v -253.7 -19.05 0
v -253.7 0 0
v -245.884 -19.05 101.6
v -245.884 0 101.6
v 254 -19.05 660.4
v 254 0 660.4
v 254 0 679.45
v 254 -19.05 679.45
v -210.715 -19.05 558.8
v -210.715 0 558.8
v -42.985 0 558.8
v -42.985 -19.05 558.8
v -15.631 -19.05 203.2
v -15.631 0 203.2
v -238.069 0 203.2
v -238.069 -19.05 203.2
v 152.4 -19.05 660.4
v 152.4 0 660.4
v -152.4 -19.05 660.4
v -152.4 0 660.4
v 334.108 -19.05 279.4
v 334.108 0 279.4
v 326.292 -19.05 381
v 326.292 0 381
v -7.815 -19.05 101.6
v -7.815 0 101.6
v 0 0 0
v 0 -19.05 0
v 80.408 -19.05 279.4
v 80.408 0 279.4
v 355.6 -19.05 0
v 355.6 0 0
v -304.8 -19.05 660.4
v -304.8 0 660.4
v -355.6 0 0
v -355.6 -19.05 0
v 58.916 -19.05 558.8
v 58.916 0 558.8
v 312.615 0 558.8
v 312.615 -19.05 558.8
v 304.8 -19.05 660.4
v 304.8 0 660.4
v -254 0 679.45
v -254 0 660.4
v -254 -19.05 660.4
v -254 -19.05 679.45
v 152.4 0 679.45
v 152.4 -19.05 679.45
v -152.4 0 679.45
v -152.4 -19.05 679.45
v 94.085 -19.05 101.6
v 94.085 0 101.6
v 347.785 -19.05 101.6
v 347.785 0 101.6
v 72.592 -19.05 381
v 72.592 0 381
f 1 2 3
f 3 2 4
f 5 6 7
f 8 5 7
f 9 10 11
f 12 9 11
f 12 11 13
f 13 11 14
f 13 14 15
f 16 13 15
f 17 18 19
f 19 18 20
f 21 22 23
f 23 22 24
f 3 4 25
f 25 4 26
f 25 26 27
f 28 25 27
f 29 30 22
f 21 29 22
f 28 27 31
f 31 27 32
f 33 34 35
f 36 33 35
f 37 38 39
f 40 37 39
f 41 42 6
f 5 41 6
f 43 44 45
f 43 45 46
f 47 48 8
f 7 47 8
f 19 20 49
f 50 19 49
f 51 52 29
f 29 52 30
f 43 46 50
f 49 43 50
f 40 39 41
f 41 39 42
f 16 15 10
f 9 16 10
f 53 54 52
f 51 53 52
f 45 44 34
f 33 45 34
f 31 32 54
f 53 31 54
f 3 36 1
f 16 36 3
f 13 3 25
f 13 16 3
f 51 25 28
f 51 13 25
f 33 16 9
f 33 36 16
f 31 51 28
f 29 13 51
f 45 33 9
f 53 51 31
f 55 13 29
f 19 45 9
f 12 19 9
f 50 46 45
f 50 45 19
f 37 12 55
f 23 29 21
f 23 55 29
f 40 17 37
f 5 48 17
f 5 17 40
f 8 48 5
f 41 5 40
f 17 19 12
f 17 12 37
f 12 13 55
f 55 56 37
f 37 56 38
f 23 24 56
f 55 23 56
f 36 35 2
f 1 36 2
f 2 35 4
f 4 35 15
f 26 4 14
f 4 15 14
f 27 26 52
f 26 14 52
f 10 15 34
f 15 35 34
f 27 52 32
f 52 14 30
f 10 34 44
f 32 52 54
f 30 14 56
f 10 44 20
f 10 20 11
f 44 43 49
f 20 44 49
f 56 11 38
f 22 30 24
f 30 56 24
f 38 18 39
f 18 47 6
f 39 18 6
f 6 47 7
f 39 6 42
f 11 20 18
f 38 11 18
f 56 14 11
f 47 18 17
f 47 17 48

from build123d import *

# Parameters (mm, degrees)
F1_DEPTH = 19.05
F2_W     = 101.6
F2_H     = 19.05
F3_DEPTH = 19.05


with BuildPart() as f1:
    # F0 (on Front) → F1 (new body)
    with BuildSketch(Plane.XZ):
        Polygon((304.8, 660.4), (51.1001483644, 660.4), (58.9155329798, 558.8), (312.6153846154, 558.8), align=None)
        Polygon((94.084763749, 101.6), (101.9001483644, 0), (355.6, 0), (347.7846153846, 101.6), align=None)
        Polygon((-238.0690824048, 203.2), (-245.8844670202, 101.6), (-7.8153846154, 101.6), (-15.6307692308, 203.2), align=None)
        Polygon((326.2923076923, 381), (72.5924560567, 381), (80.4078406721, 279.4), (334.1076923077, 279.4), align=None)
        Polygon((-202.8998516356, 660.4), (-304.8, 660.4), (-355.6, 0), (-253.6998516356, 0), (-245.8844670202, 101.6), (-238.0690824048, 203.2), (-210.715236251, 558.8), align=None)
        Polygon((51.1001483644, 660.4), (-50.8, 660.4), (-42.9846153846, 558.8), (-15.6307692308, 203.2), (-7.8153846154, 101.6), (0, 0), (101.9001483644, 0), (94.084763749, 101.6), (80.4078406721, 279.4), (72.5924560567, 381), (58.9155329798, 558.8), align=None)
        Polygon((-50.8, 660.4), (-202.8998516356, 660.4), (-210.715236251, 558.8), (-42.9846153846, 558.8), align=None)
    extrude(amount=F1_DEPTH)

    # F2 (on face) → F3 (join, through all)
    with BuildSketch(Plane.XZ.offset(19.05)):
        with Locations((203.2, 669.925)):
            Rectangle(F2_W, F2_H)
        with Locations((-203.2, 669.925)):
            Rectangle(F2_W, F2_H)
    extrude(amount=-F3_DEPTH)


solid = f1.part
